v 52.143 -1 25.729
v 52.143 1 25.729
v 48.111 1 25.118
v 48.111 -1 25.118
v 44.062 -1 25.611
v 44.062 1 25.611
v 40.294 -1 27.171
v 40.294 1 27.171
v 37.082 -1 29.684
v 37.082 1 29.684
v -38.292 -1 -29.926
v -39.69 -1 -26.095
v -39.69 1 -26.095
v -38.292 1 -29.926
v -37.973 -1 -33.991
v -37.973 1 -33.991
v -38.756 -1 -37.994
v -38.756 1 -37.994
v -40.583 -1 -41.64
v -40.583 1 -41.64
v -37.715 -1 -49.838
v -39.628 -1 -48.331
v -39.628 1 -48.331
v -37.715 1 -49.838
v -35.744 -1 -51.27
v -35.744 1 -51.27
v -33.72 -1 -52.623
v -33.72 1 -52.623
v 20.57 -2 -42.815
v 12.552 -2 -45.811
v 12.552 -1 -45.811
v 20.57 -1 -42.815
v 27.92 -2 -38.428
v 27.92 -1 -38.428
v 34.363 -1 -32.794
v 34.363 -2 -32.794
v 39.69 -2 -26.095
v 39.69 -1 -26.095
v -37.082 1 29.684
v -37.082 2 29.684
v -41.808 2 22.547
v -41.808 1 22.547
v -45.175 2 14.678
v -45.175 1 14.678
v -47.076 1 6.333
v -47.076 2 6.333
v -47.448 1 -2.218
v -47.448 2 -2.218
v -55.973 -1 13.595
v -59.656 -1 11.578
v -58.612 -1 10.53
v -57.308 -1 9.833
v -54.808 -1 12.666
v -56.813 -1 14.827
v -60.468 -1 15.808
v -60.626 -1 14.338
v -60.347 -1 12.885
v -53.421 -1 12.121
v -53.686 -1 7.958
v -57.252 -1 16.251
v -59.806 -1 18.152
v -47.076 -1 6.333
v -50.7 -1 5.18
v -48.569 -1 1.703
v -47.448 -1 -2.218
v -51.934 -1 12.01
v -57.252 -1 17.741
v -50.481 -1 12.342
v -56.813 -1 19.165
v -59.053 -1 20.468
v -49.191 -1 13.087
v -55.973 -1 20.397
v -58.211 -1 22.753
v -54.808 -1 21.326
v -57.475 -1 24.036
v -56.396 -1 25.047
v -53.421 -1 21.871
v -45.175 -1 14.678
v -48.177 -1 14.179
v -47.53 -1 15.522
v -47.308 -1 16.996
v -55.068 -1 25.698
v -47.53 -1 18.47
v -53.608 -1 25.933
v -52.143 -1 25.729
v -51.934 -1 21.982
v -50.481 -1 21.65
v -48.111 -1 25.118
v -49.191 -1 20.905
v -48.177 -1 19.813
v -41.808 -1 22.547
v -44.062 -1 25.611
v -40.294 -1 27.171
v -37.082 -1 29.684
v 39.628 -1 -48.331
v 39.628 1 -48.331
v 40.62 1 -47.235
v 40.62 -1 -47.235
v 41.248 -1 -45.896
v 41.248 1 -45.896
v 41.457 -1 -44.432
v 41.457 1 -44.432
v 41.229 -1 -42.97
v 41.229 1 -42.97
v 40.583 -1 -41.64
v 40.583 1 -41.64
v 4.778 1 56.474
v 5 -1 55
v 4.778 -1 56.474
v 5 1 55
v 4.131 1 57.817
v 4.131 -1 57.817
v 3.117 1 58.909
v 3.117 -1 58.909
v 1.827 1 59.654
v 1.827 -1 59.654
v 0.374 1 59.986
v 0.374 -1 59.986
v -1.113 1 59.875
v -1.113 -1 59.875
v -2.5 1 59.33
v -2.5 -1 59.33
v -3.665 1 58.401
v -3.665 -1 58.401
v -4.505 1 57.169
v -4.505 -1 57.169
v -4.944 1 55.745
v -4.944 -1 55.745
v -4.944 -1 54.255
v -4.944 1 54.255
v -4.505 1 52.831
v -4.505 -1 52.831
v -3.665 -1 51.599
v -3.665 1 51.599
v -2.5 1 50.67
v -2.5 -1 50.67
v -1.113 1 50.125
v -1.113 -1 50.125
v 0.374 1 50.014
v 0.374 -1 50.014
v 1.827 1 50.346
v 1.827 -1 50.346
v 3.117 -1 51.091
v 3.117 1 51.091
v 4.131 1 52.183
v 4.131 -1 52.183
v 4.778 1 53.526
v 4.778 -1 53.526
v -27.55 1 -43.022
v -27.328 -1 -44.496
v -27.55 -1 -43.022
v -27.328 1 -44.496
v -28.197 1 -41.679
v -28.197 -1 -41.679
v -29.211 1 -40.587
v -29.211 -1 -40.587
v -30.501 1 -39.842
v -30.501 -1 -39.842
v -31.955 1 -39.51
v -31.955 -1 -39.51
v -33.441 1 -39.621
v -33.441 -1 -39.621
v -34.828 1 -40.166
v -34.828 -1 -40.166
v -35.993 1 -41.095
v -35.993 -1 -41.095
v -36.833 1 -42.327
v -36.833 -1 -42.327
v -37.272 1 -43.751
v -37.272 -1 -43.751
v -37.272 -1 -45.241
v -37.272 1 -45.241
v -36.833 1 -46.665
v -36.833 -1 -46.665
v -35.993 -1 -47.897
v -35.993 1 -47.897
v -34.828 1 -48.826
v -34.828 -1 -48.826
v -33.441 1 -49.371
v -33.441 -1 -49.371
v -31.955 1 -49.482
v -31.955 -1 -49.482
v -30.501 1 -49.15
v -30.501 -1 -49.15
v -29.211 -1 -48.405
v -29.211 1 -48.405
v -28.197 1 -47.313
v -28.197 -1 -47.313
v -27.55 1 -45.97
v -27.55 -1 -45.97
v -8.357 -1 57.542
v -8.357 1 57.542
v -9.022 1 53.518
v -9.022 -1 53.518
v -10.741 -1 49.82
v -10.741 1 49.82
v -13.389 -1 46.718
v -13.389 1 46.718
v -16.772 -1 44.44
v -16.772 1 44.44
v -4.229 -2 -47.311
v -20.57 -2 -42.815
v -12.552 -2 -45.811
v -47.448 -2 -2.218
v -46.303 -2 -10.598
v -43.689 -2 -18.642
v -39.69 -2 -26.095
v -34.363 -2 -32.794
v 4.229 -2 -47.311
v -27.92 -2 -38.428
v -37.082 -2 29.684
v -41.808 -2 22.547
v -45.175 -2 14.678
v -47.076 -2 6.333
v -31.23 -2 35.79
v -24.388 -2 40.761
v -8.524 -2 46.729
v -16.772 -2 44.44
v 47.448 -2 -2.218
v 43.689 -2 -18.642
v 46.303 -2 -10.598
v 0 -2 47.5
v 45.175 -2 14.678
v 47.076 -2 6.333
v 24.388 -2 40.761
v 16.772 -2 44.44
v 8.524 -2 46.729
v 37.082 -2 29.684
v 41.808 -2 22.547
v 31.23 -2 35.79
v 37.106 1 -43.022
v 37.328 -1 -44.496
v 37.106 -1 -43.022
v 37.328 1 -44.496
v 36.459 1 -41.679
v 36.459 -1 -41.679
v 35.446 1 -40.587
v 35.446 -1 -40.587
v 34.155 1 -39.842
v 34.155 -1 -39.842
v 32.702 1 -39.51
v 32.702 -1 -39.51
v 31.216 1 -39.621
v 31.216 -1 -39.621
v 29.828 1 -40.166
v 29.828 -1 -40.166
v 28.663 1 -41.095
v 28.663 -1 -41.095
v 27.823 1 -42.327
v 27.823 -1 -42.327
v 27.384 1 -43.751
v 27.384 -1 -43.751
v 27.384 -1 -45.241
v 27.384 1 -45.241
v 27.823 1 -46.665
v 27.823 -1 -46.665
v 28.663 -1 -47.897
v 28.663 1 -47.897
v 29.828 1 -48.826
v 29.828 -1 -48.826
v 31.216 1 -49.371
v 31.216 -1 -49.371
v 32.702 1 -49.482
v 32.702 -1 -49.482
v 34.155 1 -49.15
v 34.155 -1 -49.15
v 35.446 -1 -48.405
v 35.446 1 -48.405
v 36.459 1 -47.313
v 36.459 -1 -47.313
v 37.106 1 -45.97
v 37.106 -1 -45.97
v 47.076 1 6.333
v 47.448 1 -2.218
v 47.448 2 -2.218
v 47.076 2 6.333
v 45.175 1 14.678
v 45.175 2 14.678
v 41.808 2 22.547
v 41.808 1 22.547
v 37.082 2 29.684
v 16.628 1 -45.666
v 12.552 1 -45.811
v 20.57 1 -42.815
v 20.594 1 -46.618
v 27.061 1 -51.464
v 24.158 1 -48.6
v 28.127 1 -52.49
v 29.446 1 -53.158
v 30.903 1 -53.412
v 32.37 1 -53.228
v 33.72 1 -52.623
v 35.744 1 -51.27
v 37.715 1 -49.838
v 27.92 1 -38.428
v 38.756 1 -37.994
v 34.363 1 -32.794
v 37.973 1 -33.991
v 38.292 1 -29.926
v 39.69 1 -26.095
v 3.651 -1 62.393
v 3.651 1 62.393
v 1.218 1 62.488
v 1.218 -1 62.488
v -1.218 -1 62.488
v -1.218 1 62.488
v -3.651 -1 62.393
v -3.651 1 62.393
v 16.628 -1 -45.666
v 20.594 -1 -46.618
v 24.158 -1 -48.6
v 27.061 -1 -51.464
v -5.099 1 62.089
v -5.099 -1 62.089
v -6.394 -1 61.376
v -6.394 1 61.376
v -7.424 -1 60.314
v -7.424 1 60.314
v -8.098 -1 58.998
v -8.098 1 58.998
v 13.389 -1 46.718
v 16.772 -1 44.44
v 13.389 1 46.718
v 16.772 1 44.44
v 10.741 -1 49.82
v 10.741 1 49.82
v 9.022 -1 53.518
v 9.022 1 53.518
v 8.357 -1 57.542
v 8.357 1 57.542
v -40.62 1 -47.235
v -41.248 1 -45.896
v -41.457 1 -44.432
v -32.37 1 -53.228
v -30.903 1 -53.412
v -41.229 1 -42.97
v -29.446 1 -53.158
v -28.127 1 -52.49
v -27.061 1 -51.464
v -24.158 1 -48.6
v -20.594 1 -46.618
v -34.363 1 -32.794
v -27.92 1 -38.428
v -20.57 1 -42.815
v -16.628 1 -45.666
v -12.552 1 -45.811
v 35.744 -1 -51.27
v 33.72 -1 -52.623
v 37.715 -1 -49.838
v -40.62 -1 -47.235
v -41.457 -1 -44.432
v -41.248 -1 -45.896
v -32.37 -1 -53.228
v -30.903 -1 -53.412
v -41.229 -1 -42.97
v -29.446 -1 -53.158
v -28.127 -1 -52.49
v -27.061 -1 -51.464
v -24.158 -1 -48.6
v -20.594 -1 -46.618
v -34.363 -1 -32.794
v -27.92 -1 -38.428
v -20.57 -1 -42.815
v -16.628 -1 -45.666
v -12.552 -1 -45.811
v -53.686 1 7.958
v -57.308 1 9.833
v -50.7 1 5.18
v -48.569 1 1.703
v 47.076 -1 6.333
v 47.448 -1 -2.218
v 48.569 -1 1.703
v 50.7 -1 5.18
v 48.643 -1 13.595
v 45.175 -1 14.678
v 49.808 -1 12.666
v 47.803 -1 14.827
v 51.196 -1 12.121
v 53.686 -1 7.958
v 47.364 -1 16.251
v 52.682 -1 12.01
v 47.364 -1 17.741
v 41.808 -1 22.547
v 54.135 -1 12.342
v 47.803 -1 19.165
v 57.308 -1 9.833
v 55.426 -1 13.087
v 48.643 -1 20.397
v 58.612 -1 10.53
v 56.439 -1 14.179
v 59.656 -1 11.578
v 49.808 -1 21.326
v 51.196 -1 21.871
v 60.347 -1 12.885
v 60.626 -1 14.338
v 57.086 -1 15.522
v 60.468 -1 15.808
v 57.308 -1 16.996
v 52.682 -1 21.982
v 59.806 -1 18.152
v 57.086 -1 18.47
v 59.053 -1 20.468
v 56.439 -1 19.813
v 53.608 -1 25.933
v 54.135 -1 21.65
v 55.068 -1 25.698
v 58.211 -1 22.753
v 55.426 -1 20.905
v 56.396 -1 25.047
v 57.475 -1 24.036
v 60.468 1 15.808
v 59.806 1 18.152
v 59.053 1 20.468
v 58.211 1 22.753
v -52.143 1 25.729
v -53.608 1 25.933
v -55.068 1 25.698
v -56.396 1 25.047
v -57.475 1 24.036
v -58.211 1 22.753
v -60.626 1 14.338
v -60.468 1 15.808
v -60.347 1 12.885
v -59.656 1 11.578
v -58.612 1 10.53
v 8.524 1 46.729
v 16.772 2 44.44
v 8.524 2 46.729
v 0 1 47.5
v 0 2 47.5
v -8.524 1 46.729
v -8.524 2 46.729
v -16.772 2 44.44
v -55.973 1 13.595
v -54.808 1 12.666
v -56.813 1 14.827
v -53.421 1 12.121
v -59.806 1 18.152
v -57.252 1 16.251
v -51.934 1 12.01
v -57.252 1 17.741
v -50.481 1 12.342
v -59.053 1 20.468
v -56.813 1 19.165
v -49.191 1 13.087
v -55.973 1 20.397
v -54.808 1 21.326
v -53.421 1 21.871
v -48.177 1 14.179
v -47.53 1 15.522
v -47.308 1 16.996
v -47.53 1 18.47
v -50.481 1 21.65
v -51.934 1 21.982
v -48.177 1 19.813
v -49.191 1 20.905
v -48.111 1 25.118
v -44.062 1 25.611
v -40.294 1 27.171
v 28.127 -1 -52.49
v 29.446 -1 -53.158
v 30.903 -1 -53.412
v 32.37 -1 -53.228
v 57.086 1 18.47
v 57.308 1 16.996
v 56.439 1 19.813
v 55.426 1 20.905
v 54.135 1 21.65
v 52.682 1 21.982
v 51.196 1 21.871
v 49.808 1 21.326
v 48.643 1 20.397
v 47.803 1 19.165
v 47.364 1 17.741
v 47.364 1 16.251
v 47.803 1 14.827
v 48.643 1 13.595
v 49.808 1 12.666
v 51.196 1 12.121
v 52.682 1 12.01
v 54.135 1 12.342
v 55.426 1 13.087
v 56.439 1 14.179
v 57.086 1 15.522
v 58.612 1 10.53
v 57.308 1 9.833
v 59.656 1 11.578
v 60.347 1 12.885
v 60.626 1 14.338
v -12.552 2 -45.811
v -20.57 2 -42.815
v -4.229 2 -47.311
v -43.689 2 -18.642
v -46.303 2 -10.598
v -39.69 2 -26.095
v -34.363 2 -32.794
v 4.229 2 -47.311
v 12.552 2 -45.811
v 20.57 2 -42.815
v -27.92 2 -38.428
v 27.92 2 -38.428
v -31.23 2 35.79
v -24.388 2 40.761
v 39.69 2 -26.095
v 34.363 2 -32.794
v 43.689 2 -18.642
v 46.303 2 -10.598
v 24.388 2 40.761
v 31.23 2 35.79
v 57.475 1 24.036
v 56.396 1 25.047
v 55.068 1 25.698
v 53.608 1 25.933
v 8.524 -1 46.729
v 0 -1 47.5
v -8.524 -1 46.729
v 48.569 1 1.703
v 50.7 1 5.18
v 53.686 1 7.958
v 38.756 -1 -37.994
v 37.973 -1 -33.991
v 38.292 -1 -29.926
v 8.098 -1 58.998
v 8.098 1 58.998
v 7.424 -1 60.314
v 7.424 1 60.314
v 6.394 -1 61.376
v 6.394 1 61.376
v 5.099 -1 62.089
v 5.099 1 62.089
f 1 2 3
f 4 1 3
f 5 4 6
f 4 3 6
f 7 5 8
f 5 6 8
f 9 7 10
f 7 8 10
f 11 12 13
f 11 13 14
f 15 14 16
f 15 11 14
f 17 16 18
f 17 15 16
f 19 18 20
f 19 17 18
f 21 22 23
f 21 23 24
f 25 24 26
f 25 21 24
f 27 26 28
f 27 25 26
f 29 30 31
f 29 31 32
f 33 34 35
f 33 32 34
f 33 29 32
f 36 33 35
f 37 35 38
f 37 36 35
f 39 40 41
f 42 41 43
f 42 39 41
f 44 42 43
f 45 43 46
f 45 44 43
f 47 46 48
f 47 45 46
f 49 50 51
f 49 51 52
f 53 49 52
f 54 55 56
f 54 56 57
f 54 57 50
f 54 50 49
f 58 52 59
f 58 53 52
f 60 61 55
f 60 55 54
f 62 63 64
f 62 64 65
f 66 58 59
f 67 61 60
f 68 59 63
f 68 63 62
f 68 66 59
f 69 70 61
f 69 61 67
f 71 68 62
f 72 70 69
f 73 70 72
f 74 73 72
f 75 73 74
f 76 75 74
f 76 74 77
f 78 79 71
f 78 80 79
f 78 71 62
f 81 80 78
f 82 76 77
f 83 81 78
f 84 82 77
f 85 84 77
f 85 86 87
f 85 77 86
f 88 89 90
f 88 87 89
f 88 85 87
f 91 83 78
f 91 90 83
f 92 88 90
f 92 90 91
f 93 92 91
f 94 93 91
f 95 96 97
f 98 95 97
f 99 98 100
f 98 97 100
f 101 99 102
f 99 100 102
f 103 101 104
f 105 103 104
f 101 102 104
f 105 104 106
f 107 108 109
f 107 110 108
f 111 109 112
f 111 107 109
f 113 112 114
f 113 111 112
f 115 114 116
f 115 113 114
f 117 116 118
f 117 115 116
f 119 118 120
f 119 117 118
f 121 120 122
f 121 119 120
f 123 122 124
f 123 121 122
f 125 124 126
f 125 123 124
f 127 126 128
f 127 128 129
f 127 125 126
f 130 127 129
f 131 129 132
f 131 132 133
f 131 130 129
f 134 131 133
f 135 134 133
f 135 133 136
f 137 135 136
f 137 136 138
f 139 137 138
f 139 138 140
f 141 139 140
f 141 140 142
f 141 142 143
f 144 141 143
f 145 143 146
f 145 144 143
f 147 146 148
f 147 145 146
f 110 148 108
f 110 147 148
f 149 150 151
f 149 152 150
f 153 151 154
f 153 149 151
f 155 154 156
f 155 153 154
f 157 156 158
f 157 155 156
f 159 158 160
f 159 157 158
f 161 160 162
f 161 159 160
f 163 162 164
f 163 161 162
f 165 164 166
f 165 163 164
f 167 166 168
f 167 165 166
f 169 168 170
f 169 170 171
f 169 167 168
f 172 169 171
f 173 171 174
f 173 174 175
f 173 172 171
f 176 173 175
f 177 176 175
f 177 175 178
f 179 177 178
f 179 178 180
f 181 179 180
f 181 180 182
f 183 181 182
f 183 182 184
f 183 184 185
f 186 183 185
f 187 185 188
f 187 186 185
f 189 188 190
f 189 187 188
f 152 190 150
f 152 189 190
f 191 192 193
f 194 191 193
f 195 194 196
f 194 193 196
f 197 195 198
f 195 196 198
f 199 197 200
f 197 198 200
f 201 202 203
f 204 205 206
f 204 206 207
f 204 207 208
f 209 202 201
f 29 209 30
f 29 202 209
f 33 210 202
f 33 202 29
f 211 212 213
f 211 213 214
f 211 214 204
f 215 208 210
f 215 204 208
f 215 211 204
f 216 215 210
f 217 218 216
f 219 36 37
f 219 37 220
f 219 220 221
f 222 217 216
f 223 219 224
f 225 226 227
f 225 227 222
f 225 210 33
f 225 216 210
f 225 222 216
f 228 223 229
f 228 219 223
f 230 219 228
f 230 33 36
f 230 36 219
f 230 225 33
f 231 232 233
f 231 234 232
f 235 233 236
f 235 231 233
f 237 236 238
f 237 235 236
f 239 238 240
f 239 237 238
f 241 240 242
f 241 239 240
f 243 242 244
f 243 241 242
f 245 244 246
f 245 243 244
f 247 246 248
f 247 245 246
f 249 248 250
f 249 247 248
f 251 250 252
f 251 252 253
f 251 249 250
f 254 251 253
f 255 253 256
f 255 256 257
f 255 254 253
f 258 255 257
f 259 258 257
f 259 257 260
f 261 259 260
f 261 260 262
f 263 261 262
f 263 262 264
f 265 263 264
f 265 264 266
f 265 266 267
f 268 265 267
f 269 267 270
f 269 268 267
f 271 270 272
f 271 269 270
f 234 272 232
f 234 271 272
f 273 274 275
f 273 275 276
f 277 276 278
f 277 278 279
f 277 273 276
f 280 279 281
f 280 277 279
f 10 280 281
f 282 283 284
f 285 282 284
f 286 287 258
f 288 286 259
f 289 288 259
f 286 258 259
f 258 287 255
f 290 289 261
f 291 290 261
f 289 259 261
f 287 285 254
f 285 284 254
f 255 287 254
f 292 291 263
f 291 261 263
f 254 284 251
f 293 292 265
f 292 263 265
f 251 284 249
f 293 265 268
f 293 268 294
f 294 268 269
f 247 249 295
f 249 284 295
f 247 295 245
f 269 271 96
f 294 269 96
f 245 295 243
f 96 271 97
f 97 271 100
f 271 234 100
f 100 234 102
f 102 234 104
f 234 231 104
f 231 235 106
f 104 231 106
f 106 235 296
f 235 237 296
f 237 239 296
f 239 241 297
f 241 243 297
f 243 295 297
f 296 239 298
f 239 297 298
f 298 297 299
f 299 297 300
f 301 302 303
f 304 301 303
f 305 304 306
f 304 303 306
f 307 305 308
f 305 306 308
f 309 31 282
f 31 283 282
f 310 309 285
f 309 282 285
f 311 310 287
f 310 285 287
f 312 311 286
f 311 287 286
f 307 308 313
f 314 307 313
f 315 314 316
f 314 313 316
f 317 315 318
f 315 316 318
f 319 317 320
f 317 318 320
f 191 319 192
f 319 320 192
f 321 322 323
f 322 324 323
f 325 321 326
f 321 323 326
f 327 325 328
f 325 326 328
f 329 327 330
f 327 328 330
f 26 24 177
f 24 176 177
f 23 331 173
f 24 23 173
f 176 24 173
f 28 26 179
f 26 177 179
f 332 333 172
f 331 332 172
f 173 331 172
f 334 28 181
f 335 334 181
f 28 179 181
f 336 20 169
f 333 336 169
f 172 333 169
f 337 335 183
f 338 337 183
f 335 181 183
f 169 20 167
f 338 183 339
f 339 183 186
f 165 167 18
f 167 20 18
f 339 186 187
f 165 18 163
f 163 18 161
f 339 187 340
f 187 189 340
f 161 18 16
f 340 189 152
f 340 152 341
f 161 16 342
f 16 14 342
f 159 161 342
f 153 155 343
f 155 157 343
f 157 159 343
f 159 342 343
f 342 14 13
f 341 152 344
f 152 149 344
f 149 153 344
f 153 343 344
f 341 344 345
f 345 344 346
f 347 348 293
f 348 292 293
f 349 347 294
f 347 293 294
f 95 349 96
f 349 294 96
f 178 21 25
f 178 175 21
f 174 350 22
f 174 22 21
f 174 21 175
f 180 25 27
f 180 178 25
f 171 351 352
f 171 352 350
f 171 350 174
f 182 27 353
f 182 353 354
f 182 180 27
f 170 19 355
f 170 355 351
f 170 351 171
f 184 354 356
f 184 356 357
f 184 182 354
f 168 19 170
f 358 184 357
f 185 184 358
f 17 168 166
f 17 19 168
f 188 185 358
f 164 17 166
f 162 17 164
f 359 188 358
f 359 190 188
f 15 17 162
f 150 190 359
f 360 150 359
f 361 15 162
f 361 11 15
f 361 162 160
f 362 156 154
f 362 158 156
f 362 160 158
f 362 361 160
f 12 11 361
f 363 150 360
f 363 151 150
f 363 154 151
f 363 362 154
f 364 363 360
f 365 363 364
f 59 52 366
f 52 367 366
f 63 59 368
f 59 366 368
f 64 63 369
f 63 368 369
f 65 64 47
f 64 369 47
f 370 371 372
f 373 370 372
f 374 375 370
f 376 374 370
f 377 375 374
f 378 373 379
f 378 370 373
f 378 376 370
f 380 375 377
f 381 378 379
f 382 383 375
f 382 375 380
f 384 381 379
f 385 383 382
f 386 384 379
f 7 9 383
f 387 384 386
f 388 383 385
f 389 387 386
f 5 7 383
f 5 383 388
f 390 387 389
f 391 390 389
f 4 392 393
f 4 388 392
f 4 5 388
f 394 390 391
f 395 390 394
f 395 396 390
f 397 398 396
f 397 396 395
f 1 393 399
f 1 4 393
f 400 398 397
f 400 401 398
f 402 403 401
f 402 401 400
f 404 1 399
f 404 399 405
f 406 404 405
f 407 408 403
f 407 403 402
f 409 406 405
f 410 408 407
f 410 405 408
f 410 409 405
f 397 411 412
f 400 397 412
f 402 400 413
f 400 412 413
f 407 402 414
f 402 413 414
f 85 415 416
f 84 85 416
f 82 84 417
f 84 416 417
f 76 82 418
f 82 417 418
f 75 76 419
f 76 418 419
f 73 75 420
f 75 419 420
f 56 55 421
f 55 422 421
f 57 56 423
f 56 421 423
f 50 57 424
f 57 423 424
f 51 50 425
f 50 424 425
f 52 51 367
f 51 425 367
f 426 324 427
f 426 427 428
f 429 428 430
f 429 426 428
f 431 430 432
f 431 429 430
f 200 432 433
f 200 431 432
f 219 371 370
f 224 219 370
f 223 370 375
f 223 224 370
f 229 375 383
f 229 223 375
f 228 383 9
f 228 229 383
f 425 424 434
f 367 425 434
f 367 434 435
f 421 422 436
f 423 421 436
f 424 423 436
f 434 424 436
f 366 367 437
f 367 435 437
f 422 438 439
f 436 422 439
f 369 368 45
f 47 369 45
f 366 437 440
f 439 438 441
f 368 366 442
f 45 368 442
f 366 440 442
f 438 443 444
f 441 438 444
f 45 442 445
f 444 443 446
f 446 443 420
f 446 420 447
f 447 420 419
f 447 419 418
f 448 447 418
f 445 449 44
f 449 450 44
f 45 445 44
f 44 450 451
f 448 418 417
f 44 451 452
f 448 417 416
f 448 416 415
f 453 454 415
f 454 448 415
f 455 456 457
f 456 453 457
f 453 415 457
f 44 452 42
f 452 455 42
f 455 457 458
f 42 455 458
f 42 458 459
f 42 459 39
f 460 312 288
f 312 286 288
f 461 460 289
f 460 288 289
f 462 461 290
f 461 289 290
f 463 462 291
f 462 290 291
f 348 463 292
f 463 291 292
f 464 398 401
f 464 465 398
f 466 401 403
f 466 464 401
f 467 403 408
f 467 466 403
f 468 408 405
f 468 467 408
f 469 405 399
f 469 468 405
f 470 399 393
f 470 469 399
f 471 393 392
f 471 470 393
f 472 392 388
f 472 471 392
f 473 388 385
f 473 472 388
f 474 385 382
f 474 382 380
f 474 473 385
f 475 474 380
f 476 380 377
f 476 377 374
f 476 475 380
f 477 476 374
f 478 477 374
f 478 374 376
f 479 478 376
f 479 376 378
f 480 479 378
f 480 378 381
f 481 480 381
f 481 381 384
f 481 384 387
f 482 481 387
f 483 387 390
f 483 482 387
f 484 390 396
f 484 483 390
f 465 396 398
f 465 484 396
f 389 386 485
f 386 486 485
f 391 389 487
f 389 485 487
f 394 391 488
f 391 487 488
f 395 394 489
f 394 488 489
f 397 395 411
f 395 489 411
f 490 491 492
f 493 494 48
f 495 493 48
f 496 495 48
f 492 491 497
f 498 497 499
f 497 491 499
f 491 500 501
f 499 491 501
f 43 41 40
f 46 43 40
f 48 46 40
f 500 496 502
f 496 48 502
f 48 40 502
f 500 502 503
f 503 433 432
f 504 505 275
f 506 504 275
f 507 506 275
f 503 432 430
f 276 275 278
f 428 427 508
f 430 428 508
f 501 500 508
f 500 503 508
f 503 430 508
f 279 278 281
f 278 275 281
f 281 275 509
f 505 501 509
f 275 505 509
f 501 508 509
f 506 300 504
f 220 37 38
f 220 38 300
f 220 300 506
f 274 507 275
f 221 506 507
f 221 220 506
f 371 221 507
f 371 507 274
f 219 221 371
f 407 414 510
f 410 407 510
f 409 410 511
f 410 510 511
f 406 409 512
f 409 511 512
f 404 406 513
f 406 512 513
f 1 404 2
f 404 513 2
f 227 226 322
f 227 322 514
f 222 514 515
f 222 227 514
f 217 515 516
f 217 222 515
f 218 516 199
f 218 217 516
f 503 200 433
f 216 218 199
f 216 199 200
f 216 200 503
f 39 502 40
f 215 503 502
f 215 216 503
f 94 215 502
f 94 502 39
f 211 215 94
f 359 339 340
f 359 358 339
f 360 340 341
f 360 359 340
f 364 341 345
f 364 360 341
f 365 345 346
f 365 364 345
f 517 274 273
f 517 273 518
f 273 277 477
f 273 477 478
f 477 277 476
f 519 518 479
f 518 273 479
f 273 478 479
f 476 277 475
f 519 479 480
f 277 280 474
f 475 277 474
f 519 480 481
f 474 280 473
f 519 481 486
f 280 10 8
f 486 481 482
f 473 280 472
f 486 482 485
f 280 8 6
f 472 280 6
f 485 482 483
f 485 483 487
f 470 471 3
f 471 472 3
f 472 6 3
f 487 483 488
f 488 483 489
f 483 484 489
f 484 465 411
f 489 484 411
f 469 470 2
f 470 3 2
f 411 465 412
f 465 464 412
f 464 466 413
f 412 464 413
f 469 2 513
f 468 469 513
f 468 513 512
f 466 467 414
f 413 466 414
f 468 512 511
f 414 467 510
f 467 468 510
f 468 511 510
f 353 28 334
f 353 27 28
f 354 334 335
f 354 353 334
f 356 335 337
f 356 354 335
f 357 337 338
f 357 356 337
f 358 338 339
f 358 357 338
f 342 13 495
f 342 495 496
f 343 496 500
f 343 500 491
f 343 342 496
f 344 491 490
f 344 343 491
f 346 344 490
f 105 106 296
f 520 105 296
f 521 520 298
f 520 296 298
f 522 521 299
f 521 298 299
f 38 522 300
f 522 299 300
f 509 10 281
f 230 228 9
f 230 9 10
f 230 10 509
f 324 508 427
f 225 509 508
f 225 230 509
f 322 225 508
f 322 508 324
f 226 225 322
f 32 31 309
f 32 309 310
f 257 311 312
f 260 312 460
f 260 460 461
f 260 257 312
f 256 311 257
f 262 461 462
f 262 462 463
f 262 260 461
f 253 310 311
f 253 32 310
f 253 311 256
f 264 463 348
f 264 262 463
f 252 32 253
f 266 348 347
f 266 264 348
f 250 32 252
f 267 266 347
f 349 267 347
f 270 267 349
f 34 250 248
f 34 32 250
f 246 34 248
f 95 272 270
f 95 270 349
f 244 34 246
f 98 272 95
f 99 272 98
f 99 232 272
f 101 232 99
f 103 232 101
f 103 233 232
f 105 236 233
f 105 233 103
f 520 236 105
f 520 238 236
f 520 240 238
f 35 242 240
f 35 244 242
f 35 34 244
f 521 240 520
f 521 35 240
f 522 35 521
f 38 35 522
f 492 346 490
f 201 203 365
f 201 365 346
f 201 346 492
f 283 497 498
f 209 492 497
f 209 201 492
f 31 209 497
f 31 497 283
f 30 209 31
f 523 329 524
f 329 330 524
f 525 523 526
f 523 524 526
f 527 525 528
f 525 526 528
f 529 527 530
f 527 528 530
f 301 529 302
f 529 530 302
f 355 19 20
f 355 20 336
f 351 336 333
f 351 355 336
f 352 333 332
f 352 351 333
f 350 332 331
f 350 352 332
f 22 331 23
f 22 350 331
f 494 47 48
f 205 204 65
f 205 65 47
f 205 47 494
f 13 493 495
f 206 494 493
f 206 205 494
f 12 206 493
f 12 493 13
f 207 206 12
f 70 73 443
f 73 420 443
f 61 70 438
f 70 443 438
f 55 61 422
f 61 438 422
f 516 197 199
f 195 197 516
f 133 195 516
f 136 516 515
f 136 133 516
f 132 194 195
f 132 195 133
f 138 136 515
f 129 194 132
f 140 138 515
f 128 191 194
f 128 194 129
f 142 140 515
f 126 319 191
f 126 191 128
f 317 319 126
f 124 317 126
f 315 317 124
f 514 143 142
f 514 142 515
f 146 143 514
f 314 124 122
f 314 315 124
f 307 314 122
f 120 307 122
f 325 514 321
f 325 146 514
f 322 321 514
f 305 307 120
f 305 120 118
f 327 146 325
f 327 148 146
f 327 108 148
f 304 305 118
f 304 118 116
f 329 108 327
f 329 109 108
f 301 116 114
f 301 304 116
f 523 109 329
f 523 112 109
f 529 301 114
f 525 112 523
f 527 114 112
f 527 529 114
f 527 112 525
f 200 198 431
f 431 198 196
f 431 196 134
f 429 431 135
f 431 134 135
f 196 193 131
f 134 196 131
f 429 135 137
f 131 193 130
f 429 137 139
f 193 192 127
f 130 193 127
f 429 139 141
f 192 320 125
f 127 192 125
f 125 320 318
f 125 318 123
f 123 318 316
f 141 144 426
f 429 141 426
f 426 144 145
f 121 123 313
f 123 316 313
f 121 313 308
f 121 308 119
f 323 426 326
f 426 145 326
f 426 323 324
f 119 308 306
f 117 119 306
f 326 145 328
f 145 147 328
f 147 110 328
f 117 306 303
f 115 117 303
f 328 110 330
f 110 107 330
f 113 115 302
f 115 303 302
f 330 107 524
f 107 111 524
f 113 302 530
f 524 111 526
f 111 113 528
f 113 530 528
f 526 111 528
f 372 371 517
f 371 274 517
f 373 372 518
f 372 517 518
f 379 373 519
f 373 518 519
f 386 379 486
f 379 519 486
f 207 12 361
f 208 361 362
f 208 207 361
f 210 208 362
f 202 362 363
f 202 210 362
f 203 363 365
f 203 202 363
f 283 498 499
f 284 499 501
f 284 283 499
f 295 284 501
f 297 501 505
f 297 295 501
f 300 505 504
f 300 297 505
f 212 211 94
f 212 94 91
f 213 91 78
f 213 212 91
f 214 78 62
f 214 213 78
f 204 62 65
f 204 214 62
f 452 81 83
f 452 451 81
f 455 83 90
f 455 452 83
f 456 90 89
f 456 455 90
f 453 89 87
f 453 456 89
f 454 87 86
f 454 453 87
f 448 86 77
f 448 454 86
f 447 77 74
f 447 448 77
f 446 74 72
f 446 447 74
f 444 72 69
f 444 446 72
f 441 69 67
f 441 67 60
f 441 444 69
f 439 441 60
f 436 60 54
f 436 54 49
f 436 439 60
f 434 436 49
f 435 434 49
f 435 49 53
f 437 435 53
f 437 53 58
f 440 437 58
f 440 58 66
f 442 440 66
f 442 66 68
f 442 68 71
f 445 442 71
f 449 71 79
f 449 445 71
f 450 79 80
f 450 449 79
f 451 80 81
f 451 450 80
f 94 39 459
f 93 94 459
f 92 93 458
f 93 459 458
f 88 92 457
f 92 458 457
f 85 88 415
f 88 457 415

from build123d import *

# Parameters (mm, degrees)
F1_DEPTH = 2
F0_R     = 5
F2_DEPTH = 1


with BuildPart() as f1:
    # F0 (on Front) → F1 (new body, symmetric)
    with BuildSketch(Plane.XZ):
        with BuildLine():
            ThreePointArc((-16.772187, 44.440339), (-27.919799, 38.428307), (-37.082383, 29.684118))
            ThreePointArc((-37.082383, 29.684118), (-45.175185, 14.678307), (-47.448165, -2.218477))
            ThreePointArc((-47.448165, -2.218477), (-45.175185, -14.678307), (-39.69036, -26.094546))
            ThreePointArc((-39.69036, -26.094546), (-27.919799, -38.428307), (-12.552392, -45.811434))
            ThreePointArc((-12.552392, -45.811434), (0, -47.5), (12.552392, -45.811434))
            ThreePointArc((12.552392, -45.811434), (27.919799, -38.428307), (39.69036, -26.094546))
            ThreePointArc((39.69036, -26.094546), (45.175185, -14.678307), (47.448165, -2.218477))
            ThreePointArc((47.448165, -2.218477), (45.175185, 14.678307), (37.082383, 29.684118))
            ThreePointArc((37.082383, 29.684118), (27.919799, 38.428307), (16.772187, 44.440339))
            ThreePointArc((16.772187, 44.440339), (0, 47.5), (-16.772187, 44.440339))
        make_face()
    extrude(amount=F1_DEPTH, both=True)

    # F0 (on Front) → F2 (join, symmetric)
    with BuildSketch(Plane.XZ):
        with BuildLine():
            ThreePointArc((-52.142733, 25.729399), (-55.756082, 25.421938), (-58.211244, 22.753044))
            ThreePointArc((-58.211244, 22.753044), (-59.441032, 19.313562), (-60.46779, 15.808112))
            ThreePointArc((-60.46779, 15.808112), (-60.050258, 12.205823), (-57.307718, 9.833209))
            ThreePointArc((-57.307718, 9.833209), (-50.70048, 5.179707), (-47.448165, -2.218477))
            ThreePointArc((-47.448165, -2.218477), (-45.175185, 14.678307), (-37.082383, 29.684118))
            ThreePointArc((-37.082383, 29.684118), (-44.062105, 25.610523), (-52.142733, 25.729399))
        make_face()
        with Locations((-52.308108, 16.995935)):
            Circle(F0_R, mode=Mode.SUBTRACT)
        with BuildLine():
            ThreePointArc((-8.357121, 57.541508), (-10.741116, 49.819639), (-16.772187, 44.440339))
            ThreePointArc((-16.772187, 44.440339), (0, 47.5), (16.772187, 44.440339))
            ThreePointArc((16.772187, 44.440339), (10.741116, 49.819639), (8.357121, 57.541508))
            ThreePointArc((8.357121, 57.541508), (6.948123, 60.882996), (3.651167, 62.393261))
            ThreePointArc((3.651167, 62.393261), (0, 62.5), (-3.651167, 62.393261))
            ThreePointArc((-3.651167, 62.393261), (-6.948123, 60.882996), (-8.357121, 57.541508))
        make_face()
        with Locations((0, 55)):
            Circle(F0_R, mode=Mode.SUBTRACT)
        with BuildLine():
            ThreePointArc((52.142733, 25.729399), (44.062105, 25.610523), (37.082383, 29.684118))
            ThreePointArc((37.082383, 29.684118), (45.175185, 14.678307), (47.448165, -2.218477))
            ThreePointArc((47.448165, -2.218477), (50.70048, 5.179707), (57.307718, 9.833209))
            ThreePointArc((57.307718, 9.833209), (60.050258, 12.205823), (60.46779, 15.808112))
            ThreePointArc((60.46779, 15.808112), (59.441032, 19.313562), (58.211244, 22.753044))
            ThreePointArc((58.211244, 22.753044), (55.756082, 25.421938), (52.142733, 25.729399))
        make_face()
        with Locations((52.308108, 16.995935)):
            Circle(F0_R, mode=Mode.SUBTRACT)
        with BuildLine():
            ThreePointArc((39.69036, -26.094546), (27.919799, -38.428307), (12.552392, -45.811434))
            ThreePointArc((12.552392, -45.811434), (20.593504, -46.618404), (27.060996, -51.46425))
            ThreePointArc((27.060996, -51.46425), (30.164977, -53.339382), (33.719982, -52.62331))
            ThreePointArc((33.719982, -52.62331), (36.736578, -50.563562), (39.627695, -48.331106))
            ThreePointArc((39.627695, -48.331106), (41.407277, -45.171374), (40.583103, -41.639865))
            ThreePointArc((40.583103, -41.639865), (37.972994, -33.991465), (39.69036, -26.094546))
        make_face()
        with Locations((32.328189, -44.495935)):
            Circle(F0_R, mode=Mode.SUBTRACT)
        with BuildLine():
            ThreePointArc((-12.552392, -45.811434), (-27.919799, -38.428307), (-39.69036, -26.094546))
            ThreePointArc((-39.69036, -26.094546), (-37.972994, -33.991465), (-40.583103, -41.639865))
            ThreePointArc((-40.583103, -41.639865), (-41.407277, -45.171374), (-39.627695, -48.331106))
            ThreePointArc((-39.627695, -48.331106), (-36.736578, -50.563562), (-33.719982, -52.62331))
            ThreePointArc((-33.719982, -52.62331), (-30.164977, -53.339382), (-27.060996, -51.46425))
            ThreePointArc((-27.060996, -51.46425), (-20.593504, -46.618404), (-12.552392, -45.811434))
        make_face()
        with Locations((-32.328189, -44.495935)):
            Circle(F0_R, mode=Mode.SUBTRACT)
    extrude(amount=F2_DEPTH, both=True)


solid = f1.part
